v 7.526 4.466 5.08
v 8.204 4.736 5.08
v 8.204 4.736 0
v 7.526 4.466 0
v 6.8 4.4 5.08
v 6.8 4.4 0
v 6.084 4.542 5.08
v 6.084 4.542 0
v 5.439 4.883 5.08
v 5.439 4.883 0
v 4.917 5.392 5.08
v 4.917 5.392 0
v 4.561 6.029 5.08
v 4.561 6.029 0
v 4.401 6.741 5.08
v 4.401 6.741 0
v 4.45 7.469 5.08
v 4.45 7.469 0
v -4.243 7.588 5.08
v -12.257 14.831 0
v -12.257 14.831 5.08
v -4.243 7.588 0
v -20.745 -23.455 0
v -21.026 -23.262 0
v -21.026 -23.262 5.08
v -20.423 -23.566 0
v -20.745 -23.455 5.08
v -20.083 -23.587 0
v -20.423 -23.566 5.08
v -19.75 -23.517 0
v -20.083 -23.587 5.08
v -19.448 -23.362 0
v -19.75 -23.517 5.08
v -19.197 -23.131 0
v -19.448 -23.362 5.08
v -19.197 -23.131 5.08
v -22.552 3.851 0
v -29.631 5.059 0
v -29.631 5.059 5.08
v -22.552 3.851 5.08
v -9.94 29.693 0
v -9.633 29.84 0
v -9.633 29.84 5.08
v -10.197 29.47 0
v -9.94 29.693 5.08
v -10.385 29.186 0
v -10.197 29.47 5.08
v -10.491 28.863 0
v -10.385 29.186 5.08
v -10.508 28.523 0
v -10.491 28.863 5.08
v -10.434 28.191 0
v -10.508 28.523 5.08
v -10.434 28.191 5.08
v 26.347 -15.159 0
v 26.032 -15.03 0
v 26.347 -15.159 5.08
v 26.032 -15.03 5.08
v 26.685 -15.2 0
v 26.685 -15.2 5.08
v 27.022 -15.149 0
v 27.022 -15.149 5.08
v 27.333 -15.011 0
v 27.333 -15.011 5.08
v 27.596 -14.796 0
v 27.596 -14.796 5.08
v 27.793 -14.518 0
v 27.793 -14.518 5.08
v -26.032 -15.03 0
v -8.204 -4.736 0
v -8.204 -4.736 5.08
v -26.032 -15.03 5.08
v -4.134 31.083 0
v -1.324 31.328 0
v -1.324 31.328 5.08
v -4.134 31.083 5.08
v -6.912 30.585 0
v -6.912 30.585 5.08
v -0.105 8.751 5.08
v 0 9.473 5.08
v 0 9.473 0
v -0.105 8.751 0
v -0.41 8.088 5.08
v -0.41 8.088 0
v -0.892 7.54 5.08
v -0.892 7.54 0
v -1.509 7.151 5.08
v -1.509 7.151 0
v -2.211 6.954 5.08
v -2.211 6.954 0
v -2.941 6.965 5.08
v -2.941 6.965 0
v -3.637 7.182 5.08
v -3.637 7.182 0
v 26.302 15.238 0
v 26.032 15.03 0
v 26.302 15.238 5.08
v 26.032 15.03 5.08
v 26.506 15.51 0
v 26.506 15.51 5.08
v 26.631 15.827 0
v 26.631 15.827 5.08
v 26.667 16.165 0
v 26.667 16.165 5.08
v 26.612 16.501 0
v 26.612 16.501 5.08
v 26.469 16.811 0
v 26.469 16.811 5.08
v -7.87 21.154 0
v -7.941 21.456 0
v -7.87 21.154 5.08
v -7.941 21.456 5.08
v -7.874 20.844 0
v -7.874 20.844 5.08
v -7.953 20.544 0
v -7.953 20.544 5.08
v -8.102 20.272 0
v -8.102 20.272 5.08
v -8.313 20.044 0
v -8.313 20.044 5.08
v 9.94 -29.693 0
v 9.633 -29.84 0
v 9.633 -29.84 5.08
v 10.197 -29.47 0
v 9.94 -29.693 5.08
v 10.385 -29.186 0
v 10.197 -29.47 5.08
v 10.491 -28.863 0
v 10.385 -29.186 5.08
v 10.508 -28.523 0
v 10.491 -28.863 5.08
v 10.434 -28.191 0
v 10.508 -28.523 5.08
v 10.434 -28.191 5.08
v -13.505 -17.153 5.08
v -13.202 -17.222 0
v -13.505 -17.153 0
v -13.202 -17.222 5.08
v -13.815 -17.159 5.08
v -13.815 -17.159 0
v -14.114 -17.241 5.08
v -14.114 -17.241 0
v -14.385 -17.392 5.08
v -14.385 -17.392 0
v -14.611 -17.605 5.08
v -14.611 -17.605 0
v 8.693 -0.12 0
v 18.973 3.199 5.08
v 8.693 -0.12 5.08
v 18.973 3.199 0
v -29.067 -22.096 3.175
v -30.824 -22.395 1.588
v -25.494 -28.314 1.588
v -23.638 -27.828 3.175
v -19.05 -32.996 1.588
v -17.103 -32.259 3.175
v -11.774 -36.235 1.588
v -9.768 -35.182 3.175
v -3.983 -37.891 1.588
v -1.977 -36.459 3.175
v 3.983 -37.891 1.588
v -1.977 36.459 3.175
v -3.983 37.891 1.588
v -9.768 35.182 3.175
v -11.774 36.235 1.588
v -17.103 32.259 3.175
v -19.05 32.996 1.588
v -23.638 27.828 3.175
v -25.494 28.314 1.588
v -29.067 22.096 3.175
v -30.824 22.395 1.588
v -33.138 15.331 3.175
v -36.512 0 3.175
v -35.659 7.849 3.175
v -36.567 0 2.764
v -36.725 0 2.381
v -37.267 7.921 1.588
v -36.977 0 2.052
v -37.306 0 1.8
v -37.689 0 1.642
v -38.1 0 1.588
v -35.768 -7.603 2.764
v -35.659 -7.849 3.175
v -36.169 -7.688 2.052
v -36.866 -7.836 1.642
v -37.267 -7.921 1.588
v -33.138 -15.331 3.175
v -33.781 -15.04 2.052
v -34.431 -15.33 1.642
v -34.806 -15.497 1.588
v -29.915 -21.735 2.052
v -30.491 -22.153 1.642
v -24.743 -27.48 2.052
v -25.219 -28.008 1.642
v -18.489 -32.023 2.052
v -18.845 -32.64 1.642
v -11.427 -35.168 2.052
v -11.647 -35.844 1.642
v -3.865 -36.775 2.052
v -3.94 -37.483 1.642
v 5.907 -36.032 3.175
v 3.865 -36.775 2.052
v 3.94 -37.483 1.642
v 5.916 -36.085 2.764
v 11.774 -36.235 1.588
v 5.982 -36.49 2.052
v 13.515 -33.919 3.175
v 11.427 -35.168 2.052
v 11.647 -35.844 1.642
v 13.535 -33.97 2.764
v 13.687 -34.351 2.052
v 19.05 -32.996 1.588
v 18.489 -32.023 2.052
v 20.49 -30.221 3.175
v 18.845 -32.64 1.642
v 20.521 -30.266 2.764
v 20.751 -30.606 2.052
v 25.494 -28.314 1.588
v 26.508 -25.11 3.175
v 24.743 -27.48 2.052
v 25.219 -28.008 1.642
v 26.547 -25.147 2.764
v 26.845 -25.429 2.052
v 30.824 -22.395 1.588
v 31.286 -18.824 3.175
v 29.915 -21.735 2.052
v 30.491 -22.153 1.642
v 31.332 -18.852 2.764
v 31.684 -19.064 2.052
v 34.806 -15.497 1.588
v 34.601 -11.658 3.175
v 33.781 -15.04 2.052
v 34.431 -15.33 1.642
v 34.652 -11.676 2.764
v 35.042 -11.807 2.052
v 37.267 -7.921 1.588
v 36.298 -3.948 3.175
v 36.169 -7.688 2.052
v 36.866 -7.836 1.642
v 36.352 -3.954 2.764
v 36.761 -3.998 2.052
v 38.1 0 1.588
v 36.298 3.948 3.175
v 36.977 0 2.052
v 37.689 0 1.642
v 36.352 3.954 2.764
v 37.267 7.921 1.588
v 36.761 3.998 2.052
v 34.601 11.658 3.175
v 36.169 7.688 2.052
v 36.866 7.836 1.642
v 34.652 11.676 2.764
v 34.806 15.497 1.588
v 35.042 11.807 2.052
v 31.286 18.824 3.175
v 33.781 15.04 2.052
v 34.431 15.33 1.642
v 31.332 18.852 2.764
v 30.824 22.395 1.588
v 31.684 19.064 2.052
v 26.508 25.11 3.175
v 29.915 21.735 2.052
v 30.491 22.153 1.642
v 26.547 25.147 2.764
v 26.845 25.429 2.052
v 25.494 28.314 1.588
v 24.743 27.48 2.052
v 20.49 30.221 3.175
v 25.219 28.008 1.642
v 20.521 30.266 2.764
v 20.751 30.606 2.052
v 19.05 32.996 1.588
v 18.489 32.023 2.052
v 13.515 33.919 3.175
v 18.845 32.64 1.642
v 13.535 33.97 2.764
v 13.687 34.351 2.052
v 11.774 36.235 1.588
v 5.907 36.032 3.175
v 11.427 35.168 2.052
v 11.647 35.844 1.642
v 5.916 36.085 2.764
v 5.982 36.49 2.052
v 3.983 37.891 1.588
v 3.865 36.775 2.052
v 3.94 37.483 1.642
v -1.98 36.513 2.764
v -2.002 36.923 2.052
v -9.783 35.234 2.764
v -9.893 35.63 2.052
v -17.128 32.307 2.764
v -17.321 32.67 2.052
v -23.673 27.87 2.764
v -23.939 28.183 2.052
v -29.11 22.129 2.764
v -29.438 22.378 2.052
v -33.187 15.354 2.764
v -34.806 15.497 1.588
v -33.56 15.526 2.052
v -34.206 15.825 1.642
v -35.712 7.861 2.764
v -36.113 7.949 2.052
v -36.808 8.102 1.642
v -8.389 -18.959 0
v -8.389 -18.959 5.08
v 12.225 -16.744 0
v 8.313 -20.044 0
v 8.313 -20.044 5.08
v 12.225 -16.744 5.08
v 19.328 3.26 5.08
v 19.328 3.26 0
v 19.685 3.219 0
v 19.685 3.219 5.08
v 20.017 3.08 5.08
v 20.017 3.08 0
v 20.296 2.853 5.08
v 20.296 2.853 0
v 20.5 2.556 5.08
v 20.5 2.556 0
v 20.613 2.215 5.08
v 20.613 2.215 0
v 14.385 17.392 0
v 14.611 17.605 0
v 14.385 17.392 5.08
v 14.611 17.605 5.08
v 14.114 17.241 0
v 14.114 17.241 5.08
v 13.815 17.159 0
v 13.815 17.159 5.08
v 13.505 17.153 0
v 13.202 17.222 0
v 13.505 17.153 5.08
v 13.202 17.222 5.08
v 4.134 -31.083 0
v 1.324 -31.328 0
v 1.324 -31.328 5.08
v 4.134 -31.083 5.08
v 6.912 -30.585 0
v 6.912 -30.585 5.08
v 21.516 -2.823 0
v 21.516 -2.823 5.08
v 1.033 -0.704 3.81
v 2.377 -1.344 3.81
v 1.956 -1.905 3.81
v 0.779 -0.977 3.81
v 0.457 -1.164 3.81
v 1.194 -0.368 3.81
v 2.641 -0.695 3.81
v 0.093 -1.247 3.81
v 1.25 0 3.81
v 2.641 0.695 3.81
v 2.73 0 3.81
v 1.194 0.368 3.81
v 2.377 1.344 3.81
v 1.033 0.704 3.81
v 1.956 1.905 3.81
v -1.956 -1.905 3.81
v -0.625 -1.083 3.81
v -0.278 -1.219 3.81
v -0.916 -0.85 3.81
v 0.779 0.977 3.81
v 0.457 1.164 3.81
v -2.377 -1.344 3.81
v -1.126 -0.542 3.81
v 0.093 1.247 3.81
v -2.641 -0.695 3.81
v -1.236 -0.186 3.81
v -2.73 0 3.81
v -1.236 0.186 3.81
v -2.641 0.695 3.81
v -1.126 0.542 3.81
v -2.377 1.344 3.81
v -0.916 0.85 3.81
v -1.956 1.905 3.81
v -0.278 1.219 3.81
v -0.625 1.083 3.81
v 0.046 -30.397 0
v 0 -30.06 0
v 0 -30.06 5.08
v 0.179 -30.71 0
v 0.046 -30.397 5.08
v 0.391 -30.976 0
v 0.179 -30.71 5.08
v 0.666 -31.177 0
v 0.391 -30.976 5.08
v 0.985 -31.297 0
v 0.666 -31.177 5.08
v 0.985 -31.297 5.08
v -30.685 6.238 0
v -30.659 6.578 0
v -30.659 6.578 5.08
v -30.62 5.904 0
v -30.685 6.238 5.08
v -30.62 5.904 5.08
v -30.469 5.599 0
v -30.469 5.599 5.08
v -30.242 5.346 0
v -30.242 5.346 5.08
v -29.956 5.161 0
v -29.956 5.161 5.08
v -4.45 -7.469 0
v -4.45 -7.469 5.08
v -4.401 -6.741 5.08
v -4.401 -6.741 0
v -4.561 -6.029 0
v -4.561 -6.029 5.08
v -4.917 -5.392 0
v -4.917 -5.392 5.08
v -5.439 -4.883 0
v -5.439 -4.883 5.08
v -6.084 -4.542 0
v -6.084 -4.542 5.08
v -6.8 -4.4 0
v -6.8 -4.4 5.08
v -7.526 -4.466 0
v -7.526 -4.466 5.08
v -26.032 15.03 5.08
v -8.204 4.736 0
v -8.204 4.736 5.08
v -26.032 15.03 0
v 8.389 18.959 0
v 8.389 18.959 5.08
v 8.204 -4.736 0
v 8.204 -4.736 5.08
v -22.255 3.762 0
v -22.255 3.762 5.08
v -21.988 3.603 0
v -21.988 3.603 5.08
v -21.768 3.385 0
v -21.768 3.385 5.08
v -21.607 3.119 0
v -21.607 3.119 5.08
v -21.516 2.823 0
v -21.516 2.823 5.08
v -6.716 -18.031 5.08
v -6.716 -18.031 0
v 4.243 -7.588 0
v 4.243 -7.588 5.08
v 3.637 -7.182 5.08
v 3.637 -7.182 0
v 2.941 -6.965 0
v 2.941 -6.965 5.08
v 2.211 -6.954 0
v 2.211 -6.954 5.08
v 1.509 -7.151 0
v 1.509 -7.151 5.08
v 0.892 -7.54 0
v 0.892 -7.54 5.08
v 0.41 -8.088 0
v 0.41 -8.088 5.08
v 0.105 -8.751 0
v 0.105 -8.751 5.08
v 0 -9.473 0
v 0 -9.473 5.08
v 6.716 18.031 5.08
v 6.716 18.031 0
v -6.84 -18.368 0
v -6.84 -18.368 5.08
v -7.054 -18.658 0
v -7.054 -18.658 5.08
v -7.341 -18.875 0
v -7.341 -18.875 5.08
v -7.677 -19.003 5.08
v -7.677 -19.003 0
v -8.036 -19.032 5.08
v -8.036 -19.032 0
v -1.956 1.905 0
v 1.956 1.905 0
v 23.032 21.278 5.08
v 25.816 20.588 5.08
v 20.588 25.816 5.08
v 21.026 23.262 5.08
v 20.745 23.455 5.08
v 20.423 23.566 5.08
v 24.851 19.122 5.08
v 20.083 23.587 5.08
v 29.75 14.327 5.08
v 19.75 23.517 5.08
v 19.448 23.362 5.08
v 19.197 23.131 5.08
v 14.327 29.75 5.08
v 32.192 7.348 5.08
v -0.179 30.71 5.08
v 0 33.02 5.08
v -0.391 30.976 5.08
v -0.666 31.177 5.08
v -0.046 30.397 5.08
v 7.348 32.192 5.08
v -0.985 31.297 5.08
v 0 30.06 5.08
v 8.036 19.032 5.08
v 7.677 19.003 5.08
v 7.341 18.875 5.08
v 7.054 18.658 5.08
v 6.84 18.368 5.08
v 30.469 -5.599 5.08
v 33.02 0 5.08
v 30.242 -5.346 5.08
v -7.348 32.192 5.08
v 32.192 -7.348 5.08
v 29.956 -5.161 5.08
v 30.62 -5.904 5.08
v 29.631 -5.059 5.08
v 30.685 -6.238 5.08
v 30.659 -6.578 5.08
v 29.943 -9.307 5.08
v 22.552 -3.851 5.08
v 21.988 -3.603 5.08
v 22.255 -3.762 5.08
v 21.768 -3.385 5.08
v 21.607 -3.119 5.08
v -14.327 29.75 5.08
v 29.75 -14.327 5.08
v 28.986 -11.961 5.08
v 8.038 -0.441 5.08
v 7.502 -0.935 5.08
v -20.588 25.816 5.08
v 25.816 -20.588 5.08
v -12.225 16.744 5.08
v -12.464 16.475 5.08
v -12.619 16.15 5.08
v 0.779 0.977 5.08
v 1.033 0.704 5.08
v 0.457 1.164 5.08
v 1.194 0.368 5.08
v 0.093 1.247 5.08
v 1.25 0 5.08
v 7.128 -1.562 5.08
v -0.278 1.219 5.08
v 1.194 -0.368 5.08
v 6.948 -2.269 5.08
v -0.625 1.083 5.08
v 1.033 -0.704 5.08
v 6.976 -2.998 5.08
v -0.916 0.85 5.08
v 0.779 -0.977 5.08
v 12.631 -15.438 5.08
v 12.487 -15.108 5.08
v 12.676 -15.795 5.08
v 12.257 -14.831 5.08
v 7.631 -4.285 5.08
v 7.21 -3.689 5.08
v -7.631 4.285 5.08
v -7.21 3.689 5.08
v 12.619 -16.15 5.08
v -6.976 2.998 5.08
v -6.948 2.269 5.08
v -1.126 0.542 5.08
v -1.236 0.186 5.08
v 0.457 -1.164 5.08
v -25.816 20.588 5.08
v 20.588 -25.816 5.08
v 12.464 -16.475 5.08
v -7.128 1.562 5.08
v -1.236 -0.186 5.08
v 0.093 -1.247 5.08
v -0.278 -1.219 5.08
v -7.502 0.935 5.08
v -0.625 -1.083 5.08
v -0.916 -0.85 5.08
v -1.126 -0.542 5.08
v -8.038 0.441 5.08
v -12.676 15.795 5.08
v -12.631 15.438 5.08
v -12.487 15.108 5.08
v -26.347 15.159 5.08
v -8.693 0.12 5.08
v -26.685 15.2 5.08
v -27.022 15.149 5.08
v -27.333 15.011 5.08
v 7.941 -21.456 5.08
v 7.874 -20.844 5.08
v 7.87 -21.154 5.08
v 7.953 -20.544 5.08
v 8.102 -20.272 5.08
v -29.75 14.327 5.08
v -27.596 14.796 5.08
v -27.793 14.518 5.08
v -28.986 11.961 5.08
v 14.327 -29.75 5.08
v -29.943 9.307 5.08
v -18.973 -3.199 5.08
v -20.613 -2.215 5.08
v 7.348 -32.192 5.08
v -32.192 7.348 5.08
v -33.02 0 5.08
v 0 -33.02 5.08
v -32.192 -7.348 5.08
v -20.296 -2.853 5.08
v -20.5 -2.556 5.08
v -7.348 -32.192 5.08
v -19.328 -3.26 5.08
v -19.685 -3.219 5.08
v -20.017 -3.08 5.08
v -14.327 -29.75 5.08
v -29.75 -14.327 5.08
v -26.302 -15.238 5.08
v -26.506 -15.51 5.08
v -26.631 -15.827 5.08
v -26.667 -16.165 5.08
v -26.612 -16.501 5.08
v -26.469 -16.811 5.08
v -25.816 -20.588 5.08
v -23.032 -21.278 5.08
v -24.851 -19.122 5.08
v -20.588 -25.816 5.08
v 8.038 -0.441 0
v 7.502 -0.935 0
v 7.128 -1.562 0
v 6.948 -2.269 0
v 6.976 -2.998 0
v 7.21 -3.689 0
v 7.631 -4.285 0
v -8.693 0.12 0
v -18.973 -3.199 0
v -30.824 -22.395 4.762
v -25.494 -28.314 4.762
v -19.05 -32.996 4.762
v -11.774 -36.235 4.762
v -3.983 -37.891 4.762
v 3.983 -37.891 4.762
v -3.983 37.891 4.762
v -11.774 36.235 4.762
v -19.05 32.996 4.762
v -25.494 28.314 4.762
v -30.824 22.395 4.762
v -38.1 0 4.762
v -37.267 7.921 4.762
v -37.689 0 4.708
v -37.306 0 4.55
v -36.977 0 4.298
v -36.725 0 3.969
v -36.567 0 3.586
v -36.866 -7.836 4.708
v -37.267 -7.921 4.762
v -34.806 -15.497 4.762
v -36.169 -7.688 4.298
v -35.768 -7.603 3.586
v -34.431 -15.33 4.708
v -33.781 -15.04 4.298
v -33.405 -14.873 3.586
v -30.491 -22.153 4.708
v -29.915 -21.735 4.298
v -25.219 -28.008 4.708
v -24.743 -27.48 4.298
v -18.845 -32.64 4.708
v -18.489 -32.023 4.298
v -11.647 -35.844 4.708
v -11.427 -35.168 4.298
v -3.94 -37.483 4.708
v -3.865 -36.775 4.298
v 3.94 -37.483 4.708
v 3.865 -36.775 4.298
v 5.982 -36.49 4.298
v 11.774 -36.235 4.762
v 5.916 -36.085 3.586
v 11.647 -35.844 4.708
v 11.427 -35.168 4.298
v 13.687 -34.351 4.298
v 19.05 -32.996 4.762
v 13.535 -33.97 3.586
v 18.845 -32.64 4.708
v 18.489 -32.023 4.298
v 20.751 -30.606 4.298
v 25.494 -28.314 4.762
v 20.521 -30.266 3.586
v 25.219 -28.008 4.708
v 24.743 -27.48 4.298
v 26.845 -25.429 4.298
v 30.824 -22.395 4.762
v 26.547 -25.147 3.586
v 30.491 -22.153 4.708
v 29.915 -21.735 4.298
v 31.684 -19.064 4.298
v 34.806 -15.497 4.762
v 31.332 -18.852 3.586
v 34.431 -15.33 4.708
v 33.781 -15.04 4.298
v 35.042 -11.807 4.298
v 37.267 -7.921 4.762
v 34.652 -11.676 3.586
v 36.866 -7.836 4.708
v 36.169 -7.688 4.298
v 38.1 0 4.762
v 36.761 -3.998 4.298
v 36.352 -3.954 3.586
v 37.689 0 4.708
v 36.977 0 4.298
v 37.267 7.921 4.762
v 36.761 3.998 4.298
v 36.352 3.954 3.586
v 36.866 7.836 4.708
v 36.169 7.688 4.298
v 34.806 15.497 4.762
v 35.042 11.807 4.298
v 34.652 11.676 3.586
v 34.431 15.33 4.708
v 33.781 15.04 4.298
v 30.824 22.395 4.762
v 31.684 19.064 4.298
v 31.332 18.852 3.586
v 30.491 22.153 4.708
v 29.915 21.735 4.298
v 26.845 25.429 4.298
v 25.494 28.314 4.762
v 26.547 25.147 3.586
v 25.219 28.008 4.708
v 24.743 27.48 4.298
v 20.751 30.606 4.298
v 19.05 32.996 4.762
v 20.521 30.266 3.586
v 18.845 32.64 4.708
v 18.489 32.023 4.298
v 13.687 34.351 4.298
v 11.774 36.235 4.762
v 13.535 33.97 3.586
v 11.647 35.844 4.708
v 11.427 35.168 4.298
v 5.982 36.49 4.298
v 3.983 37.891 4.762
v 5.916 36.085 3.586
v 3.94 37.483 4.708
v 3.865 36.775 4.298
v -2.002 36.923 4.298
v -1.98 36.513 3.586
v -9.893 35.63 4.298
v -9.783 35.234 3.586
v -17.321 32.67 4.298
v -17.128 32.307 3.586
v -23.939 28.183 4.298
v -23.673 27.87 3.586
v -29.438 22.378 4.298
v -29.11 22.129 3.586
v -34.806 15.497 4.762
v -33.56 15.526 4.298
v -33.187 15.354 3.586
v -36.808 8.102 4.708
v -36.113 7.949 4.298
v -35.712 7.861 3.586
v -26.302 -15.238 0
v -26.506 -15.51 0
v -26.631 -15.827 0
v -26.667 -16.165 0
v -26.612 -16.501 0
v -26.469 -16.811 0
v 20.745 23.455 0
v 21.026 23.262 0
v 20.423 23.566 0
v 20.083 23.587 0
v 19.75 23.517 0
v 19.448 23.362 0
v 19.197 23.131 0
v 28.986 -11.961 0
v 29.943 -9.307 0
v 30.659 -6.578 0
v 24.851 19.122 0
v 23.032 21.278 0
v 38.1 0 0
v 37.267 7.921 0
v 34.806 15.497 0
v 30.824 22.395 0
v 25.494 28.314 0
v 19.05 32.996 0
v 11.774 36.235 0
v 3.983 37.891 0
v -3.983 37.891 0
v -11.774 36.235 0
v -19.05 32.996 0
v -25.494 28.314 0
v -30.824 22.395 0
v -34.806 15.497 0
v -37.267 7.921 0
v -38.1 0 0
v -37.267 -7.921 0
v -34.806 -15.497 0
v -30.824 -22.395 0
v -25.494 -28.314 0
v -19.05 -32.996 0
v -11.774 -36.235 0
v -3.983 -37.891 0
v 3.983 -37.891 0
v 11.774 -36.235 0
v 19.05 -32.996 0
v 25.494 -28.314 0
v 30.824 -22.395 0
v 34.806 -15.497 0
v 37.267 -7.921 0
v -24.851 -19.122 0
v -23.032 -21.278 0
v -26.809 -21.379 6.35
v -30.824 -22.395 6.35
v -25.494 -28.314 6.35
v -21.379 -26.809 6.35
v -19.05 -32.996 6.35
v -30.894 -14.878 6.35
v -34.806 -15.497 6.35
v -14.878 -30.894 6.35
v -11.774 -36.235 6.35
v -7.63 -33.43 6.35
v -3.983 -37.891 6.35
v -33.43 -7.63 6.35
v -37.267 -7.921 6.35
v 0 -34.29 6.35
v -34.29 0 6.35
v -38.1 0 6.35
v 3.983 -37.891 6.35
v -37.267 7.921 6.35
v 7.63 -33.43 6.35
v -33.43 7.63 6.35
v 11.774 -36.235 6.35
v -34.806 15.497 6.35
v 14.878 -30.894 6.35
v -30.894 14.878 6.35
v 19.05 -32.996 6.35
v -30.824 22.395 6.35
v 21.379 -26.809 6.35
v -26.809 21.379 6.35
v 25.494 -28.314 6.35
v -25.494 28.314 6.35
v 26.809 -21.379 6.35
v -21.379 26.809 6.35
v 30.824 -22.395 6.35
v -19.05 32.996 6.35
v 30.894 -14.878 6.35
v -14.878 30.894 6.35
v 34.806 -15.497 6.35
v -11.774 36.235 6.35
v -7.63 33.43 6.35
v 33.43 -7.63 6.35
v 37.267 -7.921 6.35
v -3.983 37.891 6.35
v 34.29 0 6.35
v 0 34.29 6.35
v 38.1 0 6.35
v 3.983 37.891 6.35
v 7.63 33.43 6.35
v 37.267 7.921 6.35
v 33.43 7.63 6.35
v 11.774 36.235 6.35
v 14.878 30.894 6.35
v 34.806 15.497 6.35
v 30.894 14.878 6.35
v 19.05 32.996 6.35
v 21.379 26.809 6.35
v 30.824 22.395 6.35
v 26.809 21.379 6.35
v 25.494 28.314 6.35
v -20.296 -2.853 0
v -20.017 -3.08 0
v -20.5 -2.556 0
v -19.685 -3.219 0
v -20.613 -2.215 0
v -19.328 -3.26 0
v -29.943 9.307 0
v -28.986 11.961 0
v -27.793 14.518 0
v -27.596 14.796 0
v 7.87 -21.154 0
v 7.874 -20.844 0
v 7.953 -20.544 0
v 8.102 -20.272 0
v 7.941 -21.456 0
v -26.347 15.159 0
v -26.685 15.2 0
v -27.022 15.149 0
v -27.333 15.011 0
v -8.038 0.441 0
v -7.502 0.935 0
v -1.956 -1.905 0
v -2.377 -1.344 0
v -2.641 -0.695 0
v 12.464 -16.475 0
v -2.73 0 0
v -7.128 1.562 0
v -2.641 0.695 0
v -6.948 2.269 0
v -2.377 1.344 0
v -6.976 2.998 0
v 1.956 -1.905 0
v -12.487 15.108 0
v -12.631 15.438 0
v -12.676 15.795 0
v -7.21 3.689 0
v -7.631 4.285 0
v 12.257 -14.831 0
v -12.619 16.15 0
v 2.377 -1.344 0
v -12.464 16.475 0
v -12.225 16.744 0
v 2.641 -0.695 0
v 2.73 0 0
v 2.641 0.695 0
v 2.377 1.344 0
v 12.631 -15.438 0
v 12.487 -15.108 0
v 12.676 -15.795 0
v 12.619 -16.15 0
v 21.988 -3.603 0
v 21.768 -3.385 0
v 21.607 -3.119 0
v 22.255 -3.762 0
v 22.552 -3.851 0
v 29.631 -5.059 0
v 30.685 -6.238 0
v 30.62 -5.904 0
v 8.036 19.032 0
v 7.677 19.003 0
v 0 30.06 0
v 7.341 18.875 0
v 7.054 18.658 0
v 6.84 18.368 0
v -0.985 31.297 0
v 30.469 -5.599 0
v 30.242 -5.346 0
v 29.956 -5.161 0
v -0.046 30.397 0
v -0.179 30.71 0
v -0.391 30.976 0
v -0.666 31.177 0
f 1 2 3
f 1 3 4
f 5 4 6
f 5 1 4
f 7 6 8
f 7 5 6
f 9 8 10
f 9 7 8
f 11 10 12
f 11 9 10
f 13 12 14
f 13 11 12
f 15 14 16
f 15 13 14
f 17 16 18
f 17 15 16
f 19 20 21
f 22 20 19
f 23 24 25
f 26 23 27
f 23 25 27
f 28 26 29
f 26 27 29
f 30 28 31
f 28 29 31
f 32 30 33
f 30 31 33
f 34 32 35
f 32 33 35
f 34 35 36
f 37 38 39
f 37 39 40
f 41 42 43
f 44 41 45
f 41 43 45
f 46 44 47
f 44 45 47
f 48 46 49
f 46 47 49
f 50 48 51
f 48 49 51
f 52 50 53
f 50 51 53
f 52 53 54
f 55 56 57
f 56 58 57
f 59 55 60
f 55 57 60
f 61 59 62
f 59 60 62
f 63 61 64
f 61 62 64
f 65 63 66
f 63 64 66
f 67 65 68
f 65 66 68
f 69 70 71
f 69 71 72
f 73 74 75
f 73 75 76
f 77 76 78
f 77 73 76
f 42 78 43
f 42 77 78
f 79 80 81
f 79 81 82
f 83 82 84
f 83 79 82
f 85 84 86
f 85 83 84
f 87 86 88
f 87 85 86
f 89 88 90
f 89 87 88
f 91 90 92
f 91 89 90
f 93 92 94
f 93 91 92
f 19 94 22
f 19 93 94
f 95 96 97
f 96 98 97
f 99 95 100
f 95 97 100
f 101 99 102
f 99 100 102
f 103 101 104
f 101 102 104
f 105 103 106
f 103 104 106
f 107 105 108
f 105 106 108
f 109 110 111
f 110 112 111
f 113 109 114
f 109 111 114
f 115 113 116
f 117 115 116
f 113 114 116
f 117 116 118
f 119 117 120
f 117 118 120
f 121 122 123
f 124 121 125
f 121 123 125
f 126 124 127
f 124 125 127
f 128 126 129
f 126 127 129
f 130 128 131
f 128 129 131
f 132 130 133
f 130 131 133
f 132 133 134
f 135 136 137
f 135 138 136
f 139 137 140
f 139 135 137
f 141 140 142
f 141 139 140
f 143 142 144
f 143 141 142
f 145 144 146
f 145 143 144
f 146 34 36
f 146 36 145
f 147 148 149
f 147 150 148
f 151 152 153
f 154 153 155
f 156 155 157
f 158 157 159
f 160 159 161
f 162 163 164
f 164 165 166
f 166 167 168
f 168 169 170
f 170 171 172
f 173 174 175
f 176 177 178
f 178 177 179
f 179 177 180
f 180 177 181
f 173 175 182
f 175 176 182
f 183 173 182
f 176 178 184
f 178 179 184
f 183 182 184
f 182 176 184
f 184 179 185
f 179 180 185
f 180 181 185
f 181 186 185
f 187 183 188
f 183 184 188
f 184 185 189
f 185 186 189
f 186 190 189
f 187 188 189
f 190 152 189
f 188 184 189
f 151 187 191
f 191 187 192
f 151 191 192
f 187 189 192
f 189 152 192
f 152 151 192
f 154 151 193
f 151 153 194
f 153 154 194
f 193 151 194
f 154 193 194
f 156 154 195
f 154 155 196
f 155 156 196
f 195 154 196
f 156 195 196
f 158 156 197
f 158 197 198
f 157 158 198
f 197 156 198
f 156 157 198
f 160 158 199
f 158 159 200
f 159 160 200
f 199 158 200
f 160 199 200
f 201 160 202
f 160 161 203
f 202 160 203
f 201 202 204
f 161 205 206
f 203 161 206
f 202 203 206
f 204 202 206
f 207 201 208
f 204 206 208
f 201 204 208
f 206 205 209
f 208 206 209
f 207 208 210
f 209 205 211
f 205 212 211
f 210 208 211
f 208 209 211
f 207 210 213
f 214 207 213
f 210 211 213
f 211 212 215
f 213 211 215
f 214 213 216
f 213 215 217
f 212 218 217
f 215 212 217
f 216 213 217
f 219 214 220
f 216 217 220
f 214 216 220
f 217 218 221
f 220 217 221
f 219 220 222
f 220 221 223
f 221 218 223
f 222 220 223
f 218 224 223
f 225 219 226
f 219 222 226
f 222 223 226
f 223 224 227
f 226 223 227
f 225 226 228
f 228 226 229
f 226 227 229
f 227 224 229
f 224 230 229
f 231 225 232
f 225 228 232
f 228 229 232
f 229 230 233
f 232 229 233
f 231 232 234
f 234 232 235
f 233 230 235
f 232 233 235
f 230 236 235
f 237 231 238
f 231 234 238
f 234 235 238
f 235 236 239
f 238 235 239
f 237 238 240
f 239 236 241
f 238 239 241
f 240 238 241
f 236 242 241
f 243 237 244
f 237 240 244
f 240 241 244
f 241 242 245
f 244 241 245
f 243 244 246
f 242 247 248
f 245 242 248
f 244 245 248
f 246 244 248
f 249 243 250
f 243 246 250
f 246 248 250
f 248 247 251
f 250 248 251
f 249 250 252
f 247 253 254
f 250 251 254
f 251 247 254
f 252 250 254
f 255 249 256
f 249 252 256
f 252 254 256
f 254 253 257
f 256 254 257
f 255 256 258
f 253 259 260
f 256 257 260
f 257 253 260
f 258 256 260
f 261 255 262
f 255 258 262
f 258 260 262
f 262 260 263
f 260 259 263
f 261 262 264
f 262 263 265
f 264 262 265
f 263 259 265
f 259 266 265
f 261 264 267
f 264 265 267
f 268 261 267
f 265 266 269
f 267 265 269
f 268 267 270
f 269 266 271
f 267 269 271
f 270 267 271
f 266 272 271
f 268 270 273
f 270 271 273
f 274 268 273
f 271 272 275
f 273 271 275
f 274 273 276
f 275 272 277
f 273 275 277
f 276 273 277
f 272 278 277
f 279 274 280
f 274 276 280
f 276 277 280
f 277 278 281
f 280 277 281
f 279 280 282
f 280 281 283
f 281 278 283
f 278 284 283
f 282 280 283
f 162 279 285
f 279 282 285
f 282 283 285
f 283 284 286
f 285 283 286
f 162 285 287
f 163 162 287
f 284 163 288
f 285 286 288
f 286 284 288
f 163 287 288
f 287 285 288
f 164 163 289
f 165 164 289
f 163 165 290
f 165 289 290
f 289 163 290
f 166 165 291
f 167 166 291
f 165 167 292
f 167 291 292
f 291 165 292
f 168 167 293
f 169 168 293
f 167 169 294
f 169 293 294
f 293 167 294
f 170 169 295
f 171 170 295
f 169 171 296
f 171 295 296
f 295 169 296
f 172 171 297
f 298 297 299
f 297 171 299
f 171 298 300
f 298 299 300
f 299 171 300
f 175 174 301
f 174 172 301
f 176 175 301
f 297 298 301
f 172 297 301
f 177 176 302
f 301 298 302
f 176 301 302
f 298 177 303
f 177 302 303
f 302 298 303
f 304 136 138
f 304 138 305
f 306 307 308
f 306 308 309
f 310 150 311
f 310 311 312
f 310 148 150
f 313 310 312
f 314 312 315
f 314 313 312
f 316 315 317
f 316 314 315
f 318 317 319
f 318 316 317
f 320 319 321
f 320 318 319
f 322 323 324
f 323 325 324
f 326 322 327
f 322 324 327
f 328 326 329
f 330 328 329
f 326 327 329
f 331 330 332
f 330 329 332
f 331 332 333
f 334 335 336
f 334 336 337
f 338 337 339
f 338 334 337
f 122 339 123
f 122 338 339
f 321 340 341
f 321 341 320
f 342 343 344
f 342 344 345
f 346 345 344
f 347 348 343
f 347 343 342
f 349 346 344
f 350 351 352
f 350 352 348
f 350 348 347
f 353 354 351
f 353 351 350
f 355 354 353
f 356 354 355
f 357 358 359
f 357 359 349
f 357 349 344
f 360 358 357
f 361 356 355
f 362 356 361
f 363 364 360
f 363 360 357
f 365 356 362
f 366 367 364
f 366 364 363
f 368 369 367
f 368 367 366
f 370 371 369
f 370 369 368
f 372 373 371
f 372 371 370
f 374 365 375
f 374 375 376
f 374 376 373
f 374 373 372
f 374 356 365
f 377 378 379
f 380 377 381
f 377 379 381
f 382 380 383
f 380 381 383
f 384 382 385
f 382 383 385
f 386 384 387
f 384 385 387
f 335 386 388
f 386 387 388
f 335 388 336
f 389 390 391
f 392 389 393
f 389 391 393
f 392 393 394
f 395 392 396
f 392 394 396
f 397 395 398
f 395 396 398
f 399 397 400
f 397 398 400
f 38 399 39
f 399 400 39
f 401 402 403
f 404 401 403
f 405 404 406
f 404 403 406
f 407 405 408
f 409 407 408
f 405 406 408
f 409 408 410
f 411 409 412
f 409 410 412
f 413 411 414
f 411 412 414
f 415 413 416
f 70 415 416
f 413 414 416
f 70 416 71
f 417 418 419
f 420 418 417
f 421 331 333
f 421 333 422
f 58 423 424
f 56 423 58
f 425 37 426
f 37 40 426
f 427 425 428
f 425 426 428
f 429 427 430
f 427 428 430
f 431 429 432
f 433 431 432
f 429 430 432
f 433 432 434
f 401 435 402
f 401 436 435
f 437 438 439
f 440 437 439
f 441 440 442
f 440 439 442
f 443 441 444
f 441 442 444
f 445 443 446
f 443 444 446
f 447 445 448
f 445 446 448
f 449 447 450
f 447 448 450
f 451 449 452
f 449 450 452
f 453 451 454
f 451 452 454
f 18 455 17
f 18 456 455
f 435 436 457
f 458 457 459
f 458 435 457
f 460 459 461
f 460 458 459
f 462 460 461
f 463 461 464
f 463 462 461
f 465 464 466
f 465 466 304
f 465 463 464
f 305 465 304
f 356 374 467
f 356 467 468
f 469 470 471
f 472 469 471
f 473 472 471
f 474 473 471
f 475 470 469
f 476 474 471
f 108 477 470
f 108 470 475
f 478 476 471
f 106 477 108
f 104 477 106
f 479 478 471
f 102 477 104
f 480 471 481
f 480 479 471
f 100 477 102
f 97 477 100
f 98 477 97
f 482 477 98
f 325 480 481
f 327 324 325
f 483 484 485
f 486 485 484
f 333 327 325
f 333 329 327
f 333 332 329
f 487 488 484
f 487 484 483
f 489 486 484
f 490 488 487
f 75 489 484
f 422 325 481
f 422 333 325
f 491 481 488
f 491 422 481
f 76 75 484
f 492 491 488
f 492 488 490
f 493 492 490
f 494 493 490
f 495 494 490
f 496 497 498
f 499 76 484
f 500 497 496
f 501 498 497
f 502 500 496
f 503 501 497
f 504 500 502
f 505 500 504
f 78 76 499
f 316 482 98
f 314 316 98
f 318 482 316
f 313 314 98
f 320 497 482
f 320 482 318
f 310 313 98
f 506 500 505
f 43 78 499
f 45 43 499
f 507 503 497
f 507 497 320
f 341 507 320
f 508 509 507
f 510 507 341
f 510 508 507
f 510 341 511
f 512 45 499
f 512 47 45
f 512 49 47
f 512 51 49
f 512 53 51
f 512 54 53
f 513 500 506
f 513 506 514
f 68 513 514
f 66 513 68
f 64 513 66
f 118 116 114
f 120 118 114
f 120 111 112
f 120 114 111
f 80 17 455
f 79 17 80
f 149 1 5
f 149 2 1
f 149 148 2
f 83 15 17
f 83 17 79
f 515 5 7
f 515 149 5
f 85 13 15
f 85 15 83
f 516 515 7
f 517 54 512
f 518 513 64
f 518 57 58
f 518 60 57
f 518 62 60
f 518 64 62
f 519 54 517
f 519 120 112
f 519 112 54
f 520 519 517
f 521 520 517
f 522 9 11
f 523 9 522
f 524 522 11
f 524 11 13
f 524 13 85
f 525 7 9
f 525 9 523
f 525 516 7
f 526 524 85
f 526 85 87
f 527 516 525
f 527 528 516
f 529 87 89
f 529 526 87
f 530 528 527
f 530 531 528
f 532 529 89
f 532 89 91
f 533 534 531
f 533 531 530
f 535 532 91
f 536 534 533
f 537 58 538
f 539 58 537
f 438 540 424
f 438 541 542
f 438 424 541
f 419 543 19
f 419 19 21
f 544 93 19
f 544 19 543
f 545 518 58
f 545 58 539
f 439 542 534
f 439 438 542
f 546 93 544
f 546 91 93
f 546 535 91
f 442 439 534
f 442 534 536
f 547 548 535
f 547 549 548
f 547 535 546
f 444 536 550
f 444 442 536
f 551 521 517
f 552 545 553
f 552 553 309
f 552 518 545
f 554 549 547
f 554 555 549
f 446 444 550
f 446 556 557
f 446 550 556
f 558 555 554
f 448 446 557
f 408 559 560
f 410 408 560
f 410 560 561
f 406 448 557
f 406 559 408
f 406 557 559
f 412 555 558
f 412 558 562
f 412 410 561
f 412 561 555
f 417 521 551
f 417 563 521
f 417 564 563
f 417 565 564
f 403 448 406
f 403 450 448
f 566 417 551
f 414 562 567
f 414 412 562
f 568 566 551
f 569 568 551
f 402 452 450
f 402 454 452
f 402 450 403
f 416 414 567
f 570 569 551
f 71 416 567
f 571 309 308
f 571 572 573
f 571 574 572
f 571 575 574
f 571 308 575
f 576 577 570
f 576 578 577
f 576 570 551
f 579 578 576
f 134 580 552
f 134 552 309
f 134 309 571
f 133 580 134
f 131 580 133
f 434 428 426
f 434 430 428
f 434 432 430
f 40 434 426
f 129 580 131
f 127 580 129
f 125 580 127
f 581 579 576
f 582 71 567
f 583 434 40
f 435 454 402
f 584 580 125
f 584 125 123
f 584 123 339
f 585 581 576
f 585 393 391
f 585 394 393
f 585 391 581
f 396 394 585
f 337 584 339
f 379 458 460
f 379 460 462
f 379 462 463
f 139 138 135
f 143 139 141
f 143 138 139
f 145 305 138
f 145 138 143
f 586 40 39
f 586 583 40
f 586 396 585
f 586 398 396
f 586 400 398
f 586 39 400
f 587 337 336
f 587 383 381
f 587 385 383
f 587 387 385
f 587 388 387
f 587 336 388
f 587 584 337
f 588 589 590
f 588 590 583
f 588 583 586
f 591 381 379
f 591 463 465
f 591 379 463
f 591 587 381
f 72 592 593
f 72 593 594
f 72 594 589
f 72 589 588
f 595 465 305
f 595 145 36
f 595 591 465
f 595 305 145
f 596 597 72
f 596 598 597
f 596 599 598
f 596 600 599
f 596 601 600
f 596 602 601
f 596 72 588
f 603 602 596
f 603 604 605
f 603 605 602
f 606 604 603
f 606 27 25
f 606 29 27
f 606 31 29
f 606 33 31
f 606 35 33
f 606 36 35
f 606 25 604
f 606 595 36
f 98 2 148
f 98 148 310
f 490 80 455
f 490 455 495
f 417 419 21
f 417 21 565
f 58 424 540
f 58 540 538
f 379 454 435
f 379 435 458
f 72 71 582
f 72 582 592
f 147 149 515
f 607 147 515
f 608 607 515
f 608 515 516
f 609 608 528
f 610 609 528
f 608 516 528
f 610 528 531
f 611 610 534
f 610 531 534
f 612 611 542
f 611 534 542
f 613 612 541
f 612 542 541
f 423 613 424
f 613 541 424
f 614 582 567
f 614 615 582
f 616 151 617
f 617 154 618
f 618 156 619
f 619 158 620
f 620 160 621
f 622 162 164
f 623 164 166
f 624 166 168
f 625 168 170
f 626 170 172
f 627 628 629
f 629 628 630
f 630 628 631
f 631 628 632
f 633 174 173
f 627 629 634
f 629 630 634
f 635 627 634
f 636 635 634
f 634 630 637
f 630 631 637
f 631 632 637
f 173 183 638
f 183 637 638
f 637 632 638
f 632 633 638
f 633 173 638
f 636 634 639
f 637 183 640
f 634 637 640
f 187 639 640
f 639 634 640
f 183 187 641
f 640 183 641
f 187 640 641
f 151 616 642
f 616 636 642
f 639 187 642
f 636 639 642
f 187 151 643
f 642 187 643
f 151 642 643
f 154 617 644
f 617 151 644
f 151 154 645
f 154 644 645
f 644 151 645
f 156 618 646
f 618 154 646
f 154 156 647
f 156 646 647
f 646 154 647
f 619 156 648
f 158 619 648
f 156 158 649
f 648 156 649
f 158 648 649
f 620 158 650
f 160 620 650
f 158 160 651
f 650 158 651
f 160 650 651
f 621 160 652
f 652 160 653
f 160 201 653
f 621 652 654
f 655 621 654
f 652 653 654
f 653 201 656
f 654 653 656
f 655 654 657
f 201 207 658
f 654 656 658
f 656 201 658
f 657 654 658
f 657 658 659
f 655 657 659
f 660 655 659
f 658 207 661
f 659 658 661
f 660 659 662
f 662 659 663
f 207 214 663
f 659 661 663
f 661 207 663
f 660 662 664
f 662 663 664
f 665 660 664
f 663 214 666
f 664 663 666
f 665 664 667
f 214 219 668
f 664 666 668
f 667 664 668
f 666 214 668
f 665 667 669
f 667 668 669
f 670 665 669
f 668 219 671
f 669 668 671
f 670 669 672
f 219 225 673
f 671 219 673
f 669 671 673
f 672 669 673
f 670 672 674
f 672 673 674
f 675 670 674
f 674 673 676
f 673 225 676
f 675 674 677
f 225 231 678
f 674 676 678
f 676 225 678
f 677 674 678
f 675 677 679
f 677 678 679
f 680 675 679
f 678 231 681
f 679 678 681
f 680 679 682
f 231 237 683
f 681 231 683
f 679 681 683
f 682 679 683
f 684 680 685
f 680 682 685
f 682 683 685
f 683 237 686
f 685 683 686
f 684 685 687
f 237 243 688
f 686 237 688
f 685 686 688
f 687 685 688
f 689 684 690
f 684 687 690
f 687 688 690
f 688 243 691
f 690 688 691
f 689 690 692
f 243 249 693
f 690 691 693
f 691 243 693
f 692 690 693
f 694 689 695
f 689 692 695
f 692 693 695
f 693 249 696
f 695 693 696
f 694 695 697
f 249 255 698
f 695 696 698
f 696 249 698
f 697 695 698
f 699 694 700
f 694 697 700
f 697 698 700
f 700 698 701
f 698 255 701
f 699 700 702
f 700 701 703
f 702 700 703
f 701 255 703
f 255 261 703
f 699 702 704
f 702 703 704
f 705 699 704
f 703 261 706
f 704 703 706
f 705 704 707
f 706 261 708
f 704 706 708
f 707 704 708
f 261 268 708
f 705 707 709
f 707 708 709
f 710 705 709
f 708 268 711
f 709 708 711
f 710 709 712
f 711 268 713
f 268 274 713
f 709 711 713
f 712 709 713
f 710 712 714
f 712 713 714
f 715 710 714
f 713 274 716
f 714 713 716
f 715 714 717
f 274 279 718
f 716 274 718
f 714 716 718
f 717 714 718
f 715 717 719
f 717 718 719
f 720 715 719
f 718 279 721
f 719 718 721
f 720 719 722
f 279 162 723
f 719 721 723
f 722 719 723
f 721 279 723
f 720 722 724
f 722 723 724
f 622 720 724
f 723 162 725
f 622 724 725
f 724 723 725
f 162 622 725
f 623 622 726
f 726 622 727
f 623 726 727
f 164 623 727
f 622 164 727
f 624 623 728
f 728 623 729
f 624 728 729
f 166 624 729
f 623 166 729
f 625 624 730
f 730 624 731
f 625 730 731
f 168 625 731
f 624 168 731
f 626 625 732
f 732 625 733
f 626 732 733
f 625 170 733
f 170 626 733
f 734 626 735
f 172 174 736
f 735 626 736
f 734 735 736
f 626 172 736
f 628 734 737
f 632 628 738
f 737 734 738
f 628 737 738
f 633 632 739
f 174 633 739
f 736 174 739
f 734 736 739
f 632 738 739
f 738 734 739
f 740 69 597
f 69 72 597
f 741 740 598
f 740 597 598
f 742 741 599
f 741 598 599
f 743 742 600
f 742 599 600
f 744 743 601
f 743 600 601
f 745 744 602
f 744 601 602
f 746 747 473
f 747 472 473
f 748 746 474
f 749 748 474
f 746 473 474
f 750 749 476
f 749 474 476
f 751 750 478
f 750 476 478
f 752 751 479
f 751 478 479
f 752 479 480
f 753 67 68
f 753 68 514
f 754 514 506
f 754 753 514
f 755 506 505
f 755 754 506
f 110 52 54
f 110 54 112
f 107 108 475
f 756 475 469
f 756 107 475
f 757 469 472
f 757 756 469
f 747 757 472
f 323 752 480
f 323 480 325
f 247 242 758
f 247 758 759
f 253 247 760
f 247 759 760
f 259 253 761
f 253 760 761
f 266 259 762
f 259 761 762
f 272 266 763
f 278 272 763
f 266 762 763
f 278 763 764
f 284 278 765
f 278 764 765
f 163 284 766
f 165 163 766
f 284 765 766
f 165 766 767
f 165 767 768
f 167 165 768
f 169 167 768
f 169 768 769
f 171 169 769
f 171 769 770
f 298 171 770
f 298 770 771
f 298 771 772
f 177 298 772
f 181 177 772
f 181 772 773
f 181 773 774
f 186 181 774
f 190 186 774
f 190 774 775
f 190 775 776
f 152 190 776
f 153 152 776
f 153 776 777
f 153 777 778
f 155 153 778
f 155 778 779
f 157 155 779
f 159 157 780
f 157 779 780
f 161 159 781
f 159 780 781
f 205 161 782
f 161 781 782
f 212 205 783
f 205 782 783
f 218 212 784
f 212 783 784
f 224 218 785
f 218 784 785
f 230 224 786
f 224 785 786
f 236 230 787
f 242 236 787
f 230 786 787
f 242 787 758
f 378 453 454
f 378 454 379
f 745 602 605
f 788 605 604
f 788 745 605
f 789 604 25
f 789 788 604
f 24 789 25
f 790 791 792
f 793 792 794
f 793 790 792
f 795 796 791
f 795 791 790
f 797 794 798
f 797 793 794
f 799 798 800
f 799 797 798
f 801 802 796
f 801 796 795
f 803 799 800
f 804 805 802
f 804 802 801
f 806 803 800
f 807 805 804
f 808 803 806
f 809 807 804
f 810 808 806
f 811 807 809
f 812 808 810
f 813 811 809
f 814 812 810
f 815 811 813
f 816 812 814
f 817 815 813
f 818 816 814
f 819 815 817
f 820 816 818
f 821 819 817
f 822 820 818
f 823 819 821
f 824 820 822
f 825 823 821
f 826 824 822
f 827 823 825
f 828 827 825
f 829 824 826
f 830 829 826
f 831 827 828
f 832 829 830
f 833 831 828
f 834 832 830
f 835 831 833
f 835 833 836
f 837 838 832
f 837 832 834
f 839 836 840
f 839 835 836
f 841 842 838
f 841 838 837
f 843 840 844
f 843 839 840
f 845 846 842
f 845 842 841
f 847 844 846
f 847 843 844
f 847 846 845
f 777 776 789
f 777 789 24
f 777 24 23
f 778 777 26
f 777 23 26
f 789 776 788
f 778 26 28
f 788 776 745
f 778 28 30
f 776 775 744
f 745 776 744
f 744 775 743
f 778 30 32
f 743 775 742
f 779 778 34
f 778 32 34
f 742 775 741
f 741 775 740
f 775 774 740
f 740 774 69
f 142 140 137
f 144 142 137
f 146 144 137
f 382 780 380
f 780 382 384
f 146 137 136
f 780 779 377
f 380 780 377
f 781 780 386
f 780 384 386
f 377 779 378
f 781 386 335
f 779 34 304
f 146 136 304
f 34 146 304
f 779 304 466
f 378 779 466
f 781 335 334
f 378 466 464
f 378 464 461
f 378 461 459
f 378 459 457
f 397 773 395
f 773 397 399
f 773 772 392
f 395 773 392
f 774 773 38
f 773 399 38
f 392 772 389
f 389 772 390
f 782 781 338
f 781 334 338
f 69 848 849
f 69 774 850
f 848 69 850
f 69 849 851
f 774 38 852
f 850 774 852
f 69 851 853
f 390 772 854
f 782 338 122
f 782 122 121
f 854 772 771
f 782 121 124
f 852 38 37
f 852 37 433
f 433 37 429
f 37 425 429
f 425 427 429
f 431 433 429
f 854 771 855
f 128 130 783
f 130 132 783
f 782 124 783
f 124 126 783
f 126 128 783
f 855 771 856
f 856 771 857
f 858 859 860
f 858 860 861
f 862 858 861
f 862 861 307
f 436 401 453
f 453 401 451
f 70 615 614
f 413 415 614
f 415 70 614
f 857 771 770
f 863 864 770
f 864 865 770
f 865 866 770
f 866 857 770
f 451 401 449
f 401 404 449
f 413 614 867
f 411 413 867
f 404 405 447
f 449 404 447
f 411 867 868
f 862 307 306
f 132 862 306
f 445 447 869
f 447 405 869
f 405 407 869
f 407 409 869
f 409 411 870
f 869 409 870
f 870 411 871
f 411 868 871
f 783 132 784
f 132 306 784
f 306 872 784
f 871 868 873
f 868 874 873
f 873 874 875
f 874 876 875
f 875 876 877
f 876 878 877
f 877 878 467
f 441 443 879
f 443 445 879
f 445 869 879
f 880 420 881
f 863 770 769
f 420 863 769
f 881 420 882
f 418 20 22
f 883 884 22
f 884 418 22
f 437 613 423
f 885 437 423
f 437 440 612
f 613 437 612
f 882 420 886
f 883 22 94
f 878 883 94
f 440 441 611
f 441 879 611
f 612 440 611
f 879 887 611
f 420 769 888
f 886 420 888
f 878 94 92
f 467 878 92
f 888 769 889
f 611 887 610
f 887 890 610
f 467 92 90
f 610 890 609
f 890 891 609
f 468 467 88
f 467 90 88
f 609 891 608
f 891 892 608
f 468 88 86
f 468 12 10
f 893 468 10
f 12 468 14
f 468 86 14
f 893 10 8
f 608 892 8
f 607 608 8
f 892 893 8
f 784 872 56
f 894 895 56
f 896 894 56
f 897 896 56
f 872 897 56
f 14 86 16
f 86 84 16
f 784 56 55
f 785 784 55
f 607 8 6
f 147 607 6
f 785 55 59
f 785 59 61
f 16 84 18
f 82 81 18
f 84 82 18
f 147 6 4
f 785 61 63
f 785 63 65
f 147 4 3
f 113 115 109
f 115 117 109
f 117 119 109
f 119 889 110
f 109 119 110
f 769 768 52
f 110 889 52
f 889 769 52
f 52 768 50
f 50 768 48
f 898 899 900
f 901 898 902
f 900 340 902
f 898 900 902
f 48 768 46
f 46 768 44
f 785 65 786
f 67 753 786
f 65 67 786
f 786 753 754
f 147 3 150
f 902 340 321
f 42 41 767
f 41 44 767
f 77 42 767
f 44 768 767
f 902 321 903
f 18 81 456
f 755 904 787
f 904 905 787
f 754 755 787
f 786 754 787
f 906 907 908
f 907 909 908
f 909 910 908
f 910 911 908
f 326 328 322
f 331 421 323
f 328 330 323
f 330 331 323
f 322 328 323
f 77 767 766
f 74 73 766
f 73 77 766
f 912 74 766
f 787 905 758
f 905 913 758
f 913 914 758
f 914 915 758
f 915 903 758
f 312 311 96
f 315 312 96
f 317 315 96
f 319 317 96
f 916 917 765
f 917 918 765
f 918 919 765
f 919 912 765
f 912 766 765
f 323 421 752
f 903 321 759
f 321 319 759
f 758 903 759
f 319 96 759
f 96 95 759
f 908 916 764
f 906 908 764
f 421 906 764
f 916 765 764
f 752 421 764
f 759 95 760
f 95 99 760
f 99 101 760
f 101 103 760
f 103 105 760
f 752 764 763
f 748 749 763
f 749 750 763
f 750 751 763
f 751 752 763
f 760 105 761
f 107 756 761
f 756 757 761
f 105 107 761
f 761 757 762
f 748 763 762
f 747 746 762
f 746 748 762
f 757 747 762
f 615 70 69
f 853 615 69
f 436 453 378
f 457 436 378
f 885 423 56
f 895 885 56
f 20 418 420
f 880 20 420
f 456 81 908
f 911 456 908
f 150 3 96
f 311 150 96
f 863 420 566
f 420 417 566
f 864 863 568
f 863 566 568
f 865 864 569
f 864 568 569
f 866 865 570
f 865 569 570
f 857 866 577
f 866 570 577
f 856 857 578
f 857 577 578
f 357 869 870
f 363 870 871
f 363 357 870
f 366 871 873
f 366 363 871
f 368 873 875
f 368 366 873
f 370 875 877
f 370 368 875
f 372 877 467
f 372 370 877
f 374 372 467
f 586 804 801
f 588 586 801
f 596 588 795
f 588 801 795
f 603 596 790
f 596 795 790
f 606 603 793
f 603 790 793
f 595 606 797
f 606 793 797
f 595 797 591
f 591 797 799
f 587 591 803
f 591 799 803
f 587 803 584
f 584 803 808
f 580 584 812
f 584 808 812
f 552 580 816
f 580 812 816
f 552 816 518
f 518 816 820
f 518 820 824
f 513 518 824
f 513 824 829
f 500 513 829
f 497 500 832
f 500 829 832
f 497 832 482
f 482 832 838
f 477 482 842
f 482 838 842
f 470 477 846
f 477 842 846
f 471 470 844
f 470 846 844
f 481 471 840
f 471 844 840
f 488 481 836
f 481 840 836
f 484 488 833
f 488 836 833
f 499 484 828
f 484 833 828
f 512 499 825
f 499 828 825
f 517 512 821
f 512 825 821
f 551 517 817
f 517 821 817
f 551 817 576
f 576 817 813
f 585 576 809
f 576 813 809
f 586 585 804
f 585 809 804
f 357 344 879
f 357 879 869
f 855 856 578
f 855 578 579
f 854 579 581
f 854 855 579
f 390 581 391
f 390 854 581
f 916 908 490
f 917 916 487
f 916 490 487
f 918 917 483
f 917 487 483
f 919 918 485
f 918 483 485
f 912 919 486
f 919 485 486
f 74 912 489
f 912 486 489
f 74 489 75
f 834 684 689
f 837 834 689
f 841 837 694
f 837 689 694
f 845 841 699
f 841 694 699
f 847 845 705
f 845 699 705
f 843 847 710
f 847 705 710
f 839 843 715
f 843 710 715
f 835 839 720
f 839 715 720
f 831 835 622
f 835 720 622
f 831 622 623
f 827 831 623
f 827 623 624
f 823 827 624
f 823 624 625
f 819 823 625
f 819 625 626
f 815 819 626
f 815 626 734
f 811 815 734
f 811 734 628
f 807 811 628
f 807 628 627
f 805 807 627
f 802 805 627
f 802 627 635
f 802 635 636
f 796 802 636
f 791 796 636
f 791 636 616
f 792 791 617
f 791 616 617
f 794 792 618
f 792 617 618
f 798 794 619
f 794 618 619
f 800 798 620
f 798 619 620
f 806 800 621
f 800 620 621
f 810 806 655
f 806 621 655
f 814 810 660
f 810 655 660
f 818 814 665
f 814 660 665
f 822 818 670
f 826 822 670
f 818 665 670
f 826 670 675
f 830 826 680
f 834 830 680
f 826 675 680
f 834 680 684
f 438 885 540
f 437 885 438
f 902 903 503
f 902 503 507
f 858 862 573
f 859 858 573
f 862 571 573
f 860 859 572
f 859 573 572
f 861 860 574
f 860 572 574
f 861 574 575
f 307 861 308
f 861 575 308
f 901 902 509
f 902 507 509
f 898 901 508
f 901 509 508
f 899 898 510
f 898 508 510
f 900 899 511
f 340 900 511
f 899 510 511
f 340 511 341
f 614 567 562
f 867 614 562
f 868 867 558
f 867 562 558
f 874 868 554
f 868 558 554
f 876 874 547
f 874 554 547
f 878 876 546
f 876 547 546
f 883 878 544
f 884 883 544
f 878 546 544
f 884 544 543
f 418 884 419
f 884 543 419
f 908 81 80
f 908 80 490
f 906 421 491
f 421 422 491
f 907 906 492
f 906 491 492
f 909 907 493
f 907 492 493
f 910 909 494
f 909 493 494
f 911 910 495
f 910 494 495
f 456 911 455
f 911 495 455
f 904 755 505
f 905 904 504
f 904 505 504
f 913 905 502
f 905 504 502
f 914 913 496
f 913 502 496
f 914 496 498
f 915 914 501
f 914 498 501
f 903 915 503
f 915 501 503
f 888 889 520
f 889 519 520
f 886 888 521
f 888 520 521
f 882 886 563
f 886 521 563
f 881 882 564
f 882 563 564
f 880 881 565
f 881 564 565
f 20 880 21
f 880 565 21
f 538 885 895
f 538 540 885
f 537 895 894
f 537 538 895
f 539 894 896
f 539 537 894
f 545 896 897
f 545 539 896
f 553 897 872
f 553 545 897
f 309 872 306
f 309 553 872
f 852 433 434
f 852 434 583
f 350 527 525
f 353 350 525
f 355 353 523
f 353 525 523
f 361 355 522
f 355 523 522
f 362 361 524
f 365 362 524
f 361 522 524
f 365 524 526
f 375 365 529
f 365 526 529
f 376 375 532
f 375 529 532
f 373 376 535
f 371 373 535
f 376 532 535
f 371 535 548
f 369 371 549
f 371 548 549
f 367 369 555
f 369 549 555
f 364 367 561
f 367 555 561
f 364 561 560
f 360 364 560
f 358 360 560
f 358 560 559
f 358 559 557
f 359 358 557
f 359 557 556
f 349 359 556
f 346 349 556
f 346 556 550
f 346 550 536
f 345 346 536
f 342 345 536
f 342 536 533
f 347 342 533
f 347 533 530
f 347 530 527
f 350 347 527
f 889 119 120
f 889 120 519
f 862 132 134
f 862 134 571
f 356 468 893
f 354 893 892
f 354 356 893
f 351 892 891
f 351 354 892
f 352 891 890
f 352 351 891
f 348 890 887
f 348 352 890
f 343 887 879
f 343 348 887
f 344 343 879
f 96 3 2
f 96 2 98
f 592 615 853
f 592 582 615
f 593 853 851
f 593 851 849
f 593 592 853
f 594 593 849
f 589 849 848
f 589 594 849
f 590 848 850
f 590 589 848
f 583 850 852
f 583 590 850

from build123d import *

# Parameters (mm, degrees)
SKETCH1_R           = 38.1
BOSS_EXTRUDE1_DEPTH = 6.35
FILLET1_R           = 2.54
CUT_EXTRUDE1_START  = -2.54
CUT_EXTRUDE1_DEPTH  = 6.35
SKETCH3_W           = 34.29
SKETCH3_H           = 1.27
SKETCH3_R           = 1.5875
FILLET2_R           = 1.27
SKETCH4_R           = 1.25
CUT_EXTRUDE2_DEPTH  = 6.35
CHAMFER1_SIZE       = 1.27


with BuildPart() as part:
    # Sketch1 → Boss-Extrude1 (new body)
    with BuildSketch(Plane.XY):
        Circle(SKETCH1_R)
        with BuildLine():
            Line((0, 3.753578648), (0, 31.356419273))
            ThreePointArc((0, 31.356419273), (-5.528532606, 30.86519653), (-10.883847669, 29.406919076))
            Line((-10.883847669, 29.406919076), (-7.631535777, 20.619542081))
            Line((-7.631535777, 20.619542081), (-13.336198426, 15.806394174))
            Line((-13.336198426, 15.806394174), (0, 3.753578648))
        make_face(mode=Mode.SUBTRACT)
        with BuildLine():
            Line((20.025215132, 24.12914811), (14.041279368, 16.918874893))
            Line((14.041279368, 16.918874893), (7.020639684, 19.452683713))
            Line((7.020639684, 19.452683713), (3.250694465, 1.876789324))
            Line((3.250694465, 1.876789324), (27.155455662, 15.678209636))
            ThreePointArc((27.155455662, 15.678209636), (23.965777985, 20.220447947), (20.025215132, 24.12914811))
        make_face(mode=Mode.SUBTRACT)
        with BuildLine():
            Line((20.35683811, 3.646289539), (3.250694465, -1.876789324))
            Line((3.250694465, -1.876789324), (27.155455662, -15.678209636))
            ThreePointArc((27.155455662, -15.678209636), (29.494310591, -10.644748583), (30.909062801, -5.277770966))
            Line((30.909062801, -5.277770966), (21.672815145, -3.700667188))
            Line((21.672815145, -3.700667188), (20.35683811, 3.646289539))
        make_face(mode=Mode.SUBTRACT)
        with BuildLine():
            Line((13.336198426, -15.806394174), (0, -3.753578648))
            Line((0, -3.753578648), (0, -31.356419273))
            ThreePointArc((0, -31.356419273), (5.528532606, -30.86519653), (10.883847669, -29.406919076))
            Line((10.883847669, -29.406919076), (7.631535777, -20.619542081))
            Line((7.631535777, -20.619542081), (13.336198426, -15.806394174))
        make_face(mode=Mode.SUBTRACT)
        with BuildLine():
            Line((-7.020639684, -19.452683713), (-3.250694465, -1.876789324))
            Line((-3.250694465, -1.876789324), (-27.155455662, -15.678209636))
            ThreePointArc((-27.155455662, -15.678209636), (-23.965777985, -20.220447947), (-20.025215132, -24.12914811))
            Line((-20.025215132, -24.12914811), (-14.041279368, -16.918874893))
            Line((-14.041279368, -16.918874893), (-7.020639684, -19.452683713))
        make_face(mode=Mode.SUBTRACT)
        with BuildLine():
            Line((-20.35683811, -3.646289539), (-3.250694465, 1.876789324))
            Line((-3.250694465, 1.876789324), (-27.155455662, 15.678209636))
            ThreePointArc((-27.155455662, 15.678209636), (-29.494310591, 10.644748583), (-30.909062801, 5.277770966))
            Line((-30.909062801, 5.277770966), (-21.672815145, 3.700667188))
            Line((-21.672815145, 3.700667188), (-20.35683811, -3.646289539))
        make_face(mode=Mode.SUBTRACT)
    extrude(amount=BOSS_EXTRUDE1_DEPTH)

    # Fillet1
    fillet1_edges = [part.edges().sort_by_distance(p)[0] for p in [
        (0, 3.753578648, 3.175),
        (3.250694465, 1.876789324, 3.175),
        (3.250694465, -1.876789324, 3.175),
        (0, -3.753578648, 3.175),
        (-3.250694465, -1.876789324, 3.175),
        (-3.250694465, 1.876789324, 3.175),
    ]]
    fillet(fillet1_edges, radius=FILLET1_R)

    # Sketch2 → Cut-Extrude1 (cut)
    with BuildSketch(Plane.XY.offset(6.35).offset(CUT_EXTRUDE1_START)):
        with BuildLine():
            Line((-1.956171069, 1.905), (1.956171069, 1.905))
            ThreePointArc((1.956171069, 1.905), (2.7305, 0), (1.956171069, -1.905))
            Line((1.956171069, -1.905), (-1.956171069, -1.905))
            ThreePointArc((-1.956171069, -1.905), (-2.7305, 0), (-1.956171069, 1.905))
        make_face()
    extrude(amount=-CUT_EXTRUDE1_DEPTH, mode=Mode.SUBTRACT)

    # Sketch3 → Cut-Revolve1 (revolve, cut)
    with BuildSketch(Plane(origin=(0, 0, 0), x_dir=(1, 0, 0), z_dir=(0, 1, 0))):
        with Locations((-17.145, -5.715)):
            Rectangle(SKETCH3_W, SKETCH3_H)
        with Locations((-38.1, -3.175)):
            Circle(SKETCH3_R)
    revolve(axis=Axis((0, 0, 1.27), (0, 0, 1)), mode=Mode.SUBTRACT)

    # Fillet2
    fillet2_edges = [part.edges().sort_by_distance(p)[0] for p in [
        (-27.155455662, -15.678209636, 2.54),
        (-7.020639684, -19.452683713, 2.54),
        (-14.041279368, -16.918874893, 2.54),
        (-20.025215132, -24.12914811, 2.54),
        (13.336198426, -15.806394174, 2.54),
        (7.631535777, -20.619542081, 2.54),
        (10.883847669, -29.406919076, 2.54),
        (0, -31.356419273, 2.54),
        (20.35683811, 3.646289539, 2.54),
        (21.672815145, -3.700667188, 2.54),
        (30.909062801, -5.277770966, 2.54),
        (27.155455662, -15.678209636, 2.54),
        (27.155455662, 15.678209636, 2.54),
        (7.020639684, 19.452683713, 2.54),
        (14.041279368, 16.918874893, 2.54),
        (20.025215132, 24.12914811, 2.54),
        (0, 31.356419273, 2.54),
        (-13.336198426, 15.806394174, 2.54),
        (-7.631535777, 20.619542081, 2.54),
        (-10.883847669, 29.406919076, 2.54),
        (-20.35683811, -3.646289539, 2.54),
        (-21.672815145, 3.700667188, 2.54),
        (-30.909062801, 5.277770966, 2.54),
        (-27.155455662, 15.678209636, 2.54),
    ]]
    fillet(fillet2_edges, radius=FILLET2_R)

    # Sketch4 → Cut-Extrude2 (cut)
    with BuildSketch(Plane.XY.offset(5.08)):
        Circle(SKETCH4_R)
    extrude(amount=-CUT_EXTRUDE2_DEPTH, mode=Mode.SUBTRACT)

    # Chamfer1
    chamfer1_edges = [part.edges().sort_by_distance(p)[0] for p in [
        (34.29, 0, 5.08),
    ]]
    chamfer(chamfer1_edges, length=CHAMFER1_SIZE - 0.0001)  # a hair under: the kernel refuses the full size


solid = part.part
